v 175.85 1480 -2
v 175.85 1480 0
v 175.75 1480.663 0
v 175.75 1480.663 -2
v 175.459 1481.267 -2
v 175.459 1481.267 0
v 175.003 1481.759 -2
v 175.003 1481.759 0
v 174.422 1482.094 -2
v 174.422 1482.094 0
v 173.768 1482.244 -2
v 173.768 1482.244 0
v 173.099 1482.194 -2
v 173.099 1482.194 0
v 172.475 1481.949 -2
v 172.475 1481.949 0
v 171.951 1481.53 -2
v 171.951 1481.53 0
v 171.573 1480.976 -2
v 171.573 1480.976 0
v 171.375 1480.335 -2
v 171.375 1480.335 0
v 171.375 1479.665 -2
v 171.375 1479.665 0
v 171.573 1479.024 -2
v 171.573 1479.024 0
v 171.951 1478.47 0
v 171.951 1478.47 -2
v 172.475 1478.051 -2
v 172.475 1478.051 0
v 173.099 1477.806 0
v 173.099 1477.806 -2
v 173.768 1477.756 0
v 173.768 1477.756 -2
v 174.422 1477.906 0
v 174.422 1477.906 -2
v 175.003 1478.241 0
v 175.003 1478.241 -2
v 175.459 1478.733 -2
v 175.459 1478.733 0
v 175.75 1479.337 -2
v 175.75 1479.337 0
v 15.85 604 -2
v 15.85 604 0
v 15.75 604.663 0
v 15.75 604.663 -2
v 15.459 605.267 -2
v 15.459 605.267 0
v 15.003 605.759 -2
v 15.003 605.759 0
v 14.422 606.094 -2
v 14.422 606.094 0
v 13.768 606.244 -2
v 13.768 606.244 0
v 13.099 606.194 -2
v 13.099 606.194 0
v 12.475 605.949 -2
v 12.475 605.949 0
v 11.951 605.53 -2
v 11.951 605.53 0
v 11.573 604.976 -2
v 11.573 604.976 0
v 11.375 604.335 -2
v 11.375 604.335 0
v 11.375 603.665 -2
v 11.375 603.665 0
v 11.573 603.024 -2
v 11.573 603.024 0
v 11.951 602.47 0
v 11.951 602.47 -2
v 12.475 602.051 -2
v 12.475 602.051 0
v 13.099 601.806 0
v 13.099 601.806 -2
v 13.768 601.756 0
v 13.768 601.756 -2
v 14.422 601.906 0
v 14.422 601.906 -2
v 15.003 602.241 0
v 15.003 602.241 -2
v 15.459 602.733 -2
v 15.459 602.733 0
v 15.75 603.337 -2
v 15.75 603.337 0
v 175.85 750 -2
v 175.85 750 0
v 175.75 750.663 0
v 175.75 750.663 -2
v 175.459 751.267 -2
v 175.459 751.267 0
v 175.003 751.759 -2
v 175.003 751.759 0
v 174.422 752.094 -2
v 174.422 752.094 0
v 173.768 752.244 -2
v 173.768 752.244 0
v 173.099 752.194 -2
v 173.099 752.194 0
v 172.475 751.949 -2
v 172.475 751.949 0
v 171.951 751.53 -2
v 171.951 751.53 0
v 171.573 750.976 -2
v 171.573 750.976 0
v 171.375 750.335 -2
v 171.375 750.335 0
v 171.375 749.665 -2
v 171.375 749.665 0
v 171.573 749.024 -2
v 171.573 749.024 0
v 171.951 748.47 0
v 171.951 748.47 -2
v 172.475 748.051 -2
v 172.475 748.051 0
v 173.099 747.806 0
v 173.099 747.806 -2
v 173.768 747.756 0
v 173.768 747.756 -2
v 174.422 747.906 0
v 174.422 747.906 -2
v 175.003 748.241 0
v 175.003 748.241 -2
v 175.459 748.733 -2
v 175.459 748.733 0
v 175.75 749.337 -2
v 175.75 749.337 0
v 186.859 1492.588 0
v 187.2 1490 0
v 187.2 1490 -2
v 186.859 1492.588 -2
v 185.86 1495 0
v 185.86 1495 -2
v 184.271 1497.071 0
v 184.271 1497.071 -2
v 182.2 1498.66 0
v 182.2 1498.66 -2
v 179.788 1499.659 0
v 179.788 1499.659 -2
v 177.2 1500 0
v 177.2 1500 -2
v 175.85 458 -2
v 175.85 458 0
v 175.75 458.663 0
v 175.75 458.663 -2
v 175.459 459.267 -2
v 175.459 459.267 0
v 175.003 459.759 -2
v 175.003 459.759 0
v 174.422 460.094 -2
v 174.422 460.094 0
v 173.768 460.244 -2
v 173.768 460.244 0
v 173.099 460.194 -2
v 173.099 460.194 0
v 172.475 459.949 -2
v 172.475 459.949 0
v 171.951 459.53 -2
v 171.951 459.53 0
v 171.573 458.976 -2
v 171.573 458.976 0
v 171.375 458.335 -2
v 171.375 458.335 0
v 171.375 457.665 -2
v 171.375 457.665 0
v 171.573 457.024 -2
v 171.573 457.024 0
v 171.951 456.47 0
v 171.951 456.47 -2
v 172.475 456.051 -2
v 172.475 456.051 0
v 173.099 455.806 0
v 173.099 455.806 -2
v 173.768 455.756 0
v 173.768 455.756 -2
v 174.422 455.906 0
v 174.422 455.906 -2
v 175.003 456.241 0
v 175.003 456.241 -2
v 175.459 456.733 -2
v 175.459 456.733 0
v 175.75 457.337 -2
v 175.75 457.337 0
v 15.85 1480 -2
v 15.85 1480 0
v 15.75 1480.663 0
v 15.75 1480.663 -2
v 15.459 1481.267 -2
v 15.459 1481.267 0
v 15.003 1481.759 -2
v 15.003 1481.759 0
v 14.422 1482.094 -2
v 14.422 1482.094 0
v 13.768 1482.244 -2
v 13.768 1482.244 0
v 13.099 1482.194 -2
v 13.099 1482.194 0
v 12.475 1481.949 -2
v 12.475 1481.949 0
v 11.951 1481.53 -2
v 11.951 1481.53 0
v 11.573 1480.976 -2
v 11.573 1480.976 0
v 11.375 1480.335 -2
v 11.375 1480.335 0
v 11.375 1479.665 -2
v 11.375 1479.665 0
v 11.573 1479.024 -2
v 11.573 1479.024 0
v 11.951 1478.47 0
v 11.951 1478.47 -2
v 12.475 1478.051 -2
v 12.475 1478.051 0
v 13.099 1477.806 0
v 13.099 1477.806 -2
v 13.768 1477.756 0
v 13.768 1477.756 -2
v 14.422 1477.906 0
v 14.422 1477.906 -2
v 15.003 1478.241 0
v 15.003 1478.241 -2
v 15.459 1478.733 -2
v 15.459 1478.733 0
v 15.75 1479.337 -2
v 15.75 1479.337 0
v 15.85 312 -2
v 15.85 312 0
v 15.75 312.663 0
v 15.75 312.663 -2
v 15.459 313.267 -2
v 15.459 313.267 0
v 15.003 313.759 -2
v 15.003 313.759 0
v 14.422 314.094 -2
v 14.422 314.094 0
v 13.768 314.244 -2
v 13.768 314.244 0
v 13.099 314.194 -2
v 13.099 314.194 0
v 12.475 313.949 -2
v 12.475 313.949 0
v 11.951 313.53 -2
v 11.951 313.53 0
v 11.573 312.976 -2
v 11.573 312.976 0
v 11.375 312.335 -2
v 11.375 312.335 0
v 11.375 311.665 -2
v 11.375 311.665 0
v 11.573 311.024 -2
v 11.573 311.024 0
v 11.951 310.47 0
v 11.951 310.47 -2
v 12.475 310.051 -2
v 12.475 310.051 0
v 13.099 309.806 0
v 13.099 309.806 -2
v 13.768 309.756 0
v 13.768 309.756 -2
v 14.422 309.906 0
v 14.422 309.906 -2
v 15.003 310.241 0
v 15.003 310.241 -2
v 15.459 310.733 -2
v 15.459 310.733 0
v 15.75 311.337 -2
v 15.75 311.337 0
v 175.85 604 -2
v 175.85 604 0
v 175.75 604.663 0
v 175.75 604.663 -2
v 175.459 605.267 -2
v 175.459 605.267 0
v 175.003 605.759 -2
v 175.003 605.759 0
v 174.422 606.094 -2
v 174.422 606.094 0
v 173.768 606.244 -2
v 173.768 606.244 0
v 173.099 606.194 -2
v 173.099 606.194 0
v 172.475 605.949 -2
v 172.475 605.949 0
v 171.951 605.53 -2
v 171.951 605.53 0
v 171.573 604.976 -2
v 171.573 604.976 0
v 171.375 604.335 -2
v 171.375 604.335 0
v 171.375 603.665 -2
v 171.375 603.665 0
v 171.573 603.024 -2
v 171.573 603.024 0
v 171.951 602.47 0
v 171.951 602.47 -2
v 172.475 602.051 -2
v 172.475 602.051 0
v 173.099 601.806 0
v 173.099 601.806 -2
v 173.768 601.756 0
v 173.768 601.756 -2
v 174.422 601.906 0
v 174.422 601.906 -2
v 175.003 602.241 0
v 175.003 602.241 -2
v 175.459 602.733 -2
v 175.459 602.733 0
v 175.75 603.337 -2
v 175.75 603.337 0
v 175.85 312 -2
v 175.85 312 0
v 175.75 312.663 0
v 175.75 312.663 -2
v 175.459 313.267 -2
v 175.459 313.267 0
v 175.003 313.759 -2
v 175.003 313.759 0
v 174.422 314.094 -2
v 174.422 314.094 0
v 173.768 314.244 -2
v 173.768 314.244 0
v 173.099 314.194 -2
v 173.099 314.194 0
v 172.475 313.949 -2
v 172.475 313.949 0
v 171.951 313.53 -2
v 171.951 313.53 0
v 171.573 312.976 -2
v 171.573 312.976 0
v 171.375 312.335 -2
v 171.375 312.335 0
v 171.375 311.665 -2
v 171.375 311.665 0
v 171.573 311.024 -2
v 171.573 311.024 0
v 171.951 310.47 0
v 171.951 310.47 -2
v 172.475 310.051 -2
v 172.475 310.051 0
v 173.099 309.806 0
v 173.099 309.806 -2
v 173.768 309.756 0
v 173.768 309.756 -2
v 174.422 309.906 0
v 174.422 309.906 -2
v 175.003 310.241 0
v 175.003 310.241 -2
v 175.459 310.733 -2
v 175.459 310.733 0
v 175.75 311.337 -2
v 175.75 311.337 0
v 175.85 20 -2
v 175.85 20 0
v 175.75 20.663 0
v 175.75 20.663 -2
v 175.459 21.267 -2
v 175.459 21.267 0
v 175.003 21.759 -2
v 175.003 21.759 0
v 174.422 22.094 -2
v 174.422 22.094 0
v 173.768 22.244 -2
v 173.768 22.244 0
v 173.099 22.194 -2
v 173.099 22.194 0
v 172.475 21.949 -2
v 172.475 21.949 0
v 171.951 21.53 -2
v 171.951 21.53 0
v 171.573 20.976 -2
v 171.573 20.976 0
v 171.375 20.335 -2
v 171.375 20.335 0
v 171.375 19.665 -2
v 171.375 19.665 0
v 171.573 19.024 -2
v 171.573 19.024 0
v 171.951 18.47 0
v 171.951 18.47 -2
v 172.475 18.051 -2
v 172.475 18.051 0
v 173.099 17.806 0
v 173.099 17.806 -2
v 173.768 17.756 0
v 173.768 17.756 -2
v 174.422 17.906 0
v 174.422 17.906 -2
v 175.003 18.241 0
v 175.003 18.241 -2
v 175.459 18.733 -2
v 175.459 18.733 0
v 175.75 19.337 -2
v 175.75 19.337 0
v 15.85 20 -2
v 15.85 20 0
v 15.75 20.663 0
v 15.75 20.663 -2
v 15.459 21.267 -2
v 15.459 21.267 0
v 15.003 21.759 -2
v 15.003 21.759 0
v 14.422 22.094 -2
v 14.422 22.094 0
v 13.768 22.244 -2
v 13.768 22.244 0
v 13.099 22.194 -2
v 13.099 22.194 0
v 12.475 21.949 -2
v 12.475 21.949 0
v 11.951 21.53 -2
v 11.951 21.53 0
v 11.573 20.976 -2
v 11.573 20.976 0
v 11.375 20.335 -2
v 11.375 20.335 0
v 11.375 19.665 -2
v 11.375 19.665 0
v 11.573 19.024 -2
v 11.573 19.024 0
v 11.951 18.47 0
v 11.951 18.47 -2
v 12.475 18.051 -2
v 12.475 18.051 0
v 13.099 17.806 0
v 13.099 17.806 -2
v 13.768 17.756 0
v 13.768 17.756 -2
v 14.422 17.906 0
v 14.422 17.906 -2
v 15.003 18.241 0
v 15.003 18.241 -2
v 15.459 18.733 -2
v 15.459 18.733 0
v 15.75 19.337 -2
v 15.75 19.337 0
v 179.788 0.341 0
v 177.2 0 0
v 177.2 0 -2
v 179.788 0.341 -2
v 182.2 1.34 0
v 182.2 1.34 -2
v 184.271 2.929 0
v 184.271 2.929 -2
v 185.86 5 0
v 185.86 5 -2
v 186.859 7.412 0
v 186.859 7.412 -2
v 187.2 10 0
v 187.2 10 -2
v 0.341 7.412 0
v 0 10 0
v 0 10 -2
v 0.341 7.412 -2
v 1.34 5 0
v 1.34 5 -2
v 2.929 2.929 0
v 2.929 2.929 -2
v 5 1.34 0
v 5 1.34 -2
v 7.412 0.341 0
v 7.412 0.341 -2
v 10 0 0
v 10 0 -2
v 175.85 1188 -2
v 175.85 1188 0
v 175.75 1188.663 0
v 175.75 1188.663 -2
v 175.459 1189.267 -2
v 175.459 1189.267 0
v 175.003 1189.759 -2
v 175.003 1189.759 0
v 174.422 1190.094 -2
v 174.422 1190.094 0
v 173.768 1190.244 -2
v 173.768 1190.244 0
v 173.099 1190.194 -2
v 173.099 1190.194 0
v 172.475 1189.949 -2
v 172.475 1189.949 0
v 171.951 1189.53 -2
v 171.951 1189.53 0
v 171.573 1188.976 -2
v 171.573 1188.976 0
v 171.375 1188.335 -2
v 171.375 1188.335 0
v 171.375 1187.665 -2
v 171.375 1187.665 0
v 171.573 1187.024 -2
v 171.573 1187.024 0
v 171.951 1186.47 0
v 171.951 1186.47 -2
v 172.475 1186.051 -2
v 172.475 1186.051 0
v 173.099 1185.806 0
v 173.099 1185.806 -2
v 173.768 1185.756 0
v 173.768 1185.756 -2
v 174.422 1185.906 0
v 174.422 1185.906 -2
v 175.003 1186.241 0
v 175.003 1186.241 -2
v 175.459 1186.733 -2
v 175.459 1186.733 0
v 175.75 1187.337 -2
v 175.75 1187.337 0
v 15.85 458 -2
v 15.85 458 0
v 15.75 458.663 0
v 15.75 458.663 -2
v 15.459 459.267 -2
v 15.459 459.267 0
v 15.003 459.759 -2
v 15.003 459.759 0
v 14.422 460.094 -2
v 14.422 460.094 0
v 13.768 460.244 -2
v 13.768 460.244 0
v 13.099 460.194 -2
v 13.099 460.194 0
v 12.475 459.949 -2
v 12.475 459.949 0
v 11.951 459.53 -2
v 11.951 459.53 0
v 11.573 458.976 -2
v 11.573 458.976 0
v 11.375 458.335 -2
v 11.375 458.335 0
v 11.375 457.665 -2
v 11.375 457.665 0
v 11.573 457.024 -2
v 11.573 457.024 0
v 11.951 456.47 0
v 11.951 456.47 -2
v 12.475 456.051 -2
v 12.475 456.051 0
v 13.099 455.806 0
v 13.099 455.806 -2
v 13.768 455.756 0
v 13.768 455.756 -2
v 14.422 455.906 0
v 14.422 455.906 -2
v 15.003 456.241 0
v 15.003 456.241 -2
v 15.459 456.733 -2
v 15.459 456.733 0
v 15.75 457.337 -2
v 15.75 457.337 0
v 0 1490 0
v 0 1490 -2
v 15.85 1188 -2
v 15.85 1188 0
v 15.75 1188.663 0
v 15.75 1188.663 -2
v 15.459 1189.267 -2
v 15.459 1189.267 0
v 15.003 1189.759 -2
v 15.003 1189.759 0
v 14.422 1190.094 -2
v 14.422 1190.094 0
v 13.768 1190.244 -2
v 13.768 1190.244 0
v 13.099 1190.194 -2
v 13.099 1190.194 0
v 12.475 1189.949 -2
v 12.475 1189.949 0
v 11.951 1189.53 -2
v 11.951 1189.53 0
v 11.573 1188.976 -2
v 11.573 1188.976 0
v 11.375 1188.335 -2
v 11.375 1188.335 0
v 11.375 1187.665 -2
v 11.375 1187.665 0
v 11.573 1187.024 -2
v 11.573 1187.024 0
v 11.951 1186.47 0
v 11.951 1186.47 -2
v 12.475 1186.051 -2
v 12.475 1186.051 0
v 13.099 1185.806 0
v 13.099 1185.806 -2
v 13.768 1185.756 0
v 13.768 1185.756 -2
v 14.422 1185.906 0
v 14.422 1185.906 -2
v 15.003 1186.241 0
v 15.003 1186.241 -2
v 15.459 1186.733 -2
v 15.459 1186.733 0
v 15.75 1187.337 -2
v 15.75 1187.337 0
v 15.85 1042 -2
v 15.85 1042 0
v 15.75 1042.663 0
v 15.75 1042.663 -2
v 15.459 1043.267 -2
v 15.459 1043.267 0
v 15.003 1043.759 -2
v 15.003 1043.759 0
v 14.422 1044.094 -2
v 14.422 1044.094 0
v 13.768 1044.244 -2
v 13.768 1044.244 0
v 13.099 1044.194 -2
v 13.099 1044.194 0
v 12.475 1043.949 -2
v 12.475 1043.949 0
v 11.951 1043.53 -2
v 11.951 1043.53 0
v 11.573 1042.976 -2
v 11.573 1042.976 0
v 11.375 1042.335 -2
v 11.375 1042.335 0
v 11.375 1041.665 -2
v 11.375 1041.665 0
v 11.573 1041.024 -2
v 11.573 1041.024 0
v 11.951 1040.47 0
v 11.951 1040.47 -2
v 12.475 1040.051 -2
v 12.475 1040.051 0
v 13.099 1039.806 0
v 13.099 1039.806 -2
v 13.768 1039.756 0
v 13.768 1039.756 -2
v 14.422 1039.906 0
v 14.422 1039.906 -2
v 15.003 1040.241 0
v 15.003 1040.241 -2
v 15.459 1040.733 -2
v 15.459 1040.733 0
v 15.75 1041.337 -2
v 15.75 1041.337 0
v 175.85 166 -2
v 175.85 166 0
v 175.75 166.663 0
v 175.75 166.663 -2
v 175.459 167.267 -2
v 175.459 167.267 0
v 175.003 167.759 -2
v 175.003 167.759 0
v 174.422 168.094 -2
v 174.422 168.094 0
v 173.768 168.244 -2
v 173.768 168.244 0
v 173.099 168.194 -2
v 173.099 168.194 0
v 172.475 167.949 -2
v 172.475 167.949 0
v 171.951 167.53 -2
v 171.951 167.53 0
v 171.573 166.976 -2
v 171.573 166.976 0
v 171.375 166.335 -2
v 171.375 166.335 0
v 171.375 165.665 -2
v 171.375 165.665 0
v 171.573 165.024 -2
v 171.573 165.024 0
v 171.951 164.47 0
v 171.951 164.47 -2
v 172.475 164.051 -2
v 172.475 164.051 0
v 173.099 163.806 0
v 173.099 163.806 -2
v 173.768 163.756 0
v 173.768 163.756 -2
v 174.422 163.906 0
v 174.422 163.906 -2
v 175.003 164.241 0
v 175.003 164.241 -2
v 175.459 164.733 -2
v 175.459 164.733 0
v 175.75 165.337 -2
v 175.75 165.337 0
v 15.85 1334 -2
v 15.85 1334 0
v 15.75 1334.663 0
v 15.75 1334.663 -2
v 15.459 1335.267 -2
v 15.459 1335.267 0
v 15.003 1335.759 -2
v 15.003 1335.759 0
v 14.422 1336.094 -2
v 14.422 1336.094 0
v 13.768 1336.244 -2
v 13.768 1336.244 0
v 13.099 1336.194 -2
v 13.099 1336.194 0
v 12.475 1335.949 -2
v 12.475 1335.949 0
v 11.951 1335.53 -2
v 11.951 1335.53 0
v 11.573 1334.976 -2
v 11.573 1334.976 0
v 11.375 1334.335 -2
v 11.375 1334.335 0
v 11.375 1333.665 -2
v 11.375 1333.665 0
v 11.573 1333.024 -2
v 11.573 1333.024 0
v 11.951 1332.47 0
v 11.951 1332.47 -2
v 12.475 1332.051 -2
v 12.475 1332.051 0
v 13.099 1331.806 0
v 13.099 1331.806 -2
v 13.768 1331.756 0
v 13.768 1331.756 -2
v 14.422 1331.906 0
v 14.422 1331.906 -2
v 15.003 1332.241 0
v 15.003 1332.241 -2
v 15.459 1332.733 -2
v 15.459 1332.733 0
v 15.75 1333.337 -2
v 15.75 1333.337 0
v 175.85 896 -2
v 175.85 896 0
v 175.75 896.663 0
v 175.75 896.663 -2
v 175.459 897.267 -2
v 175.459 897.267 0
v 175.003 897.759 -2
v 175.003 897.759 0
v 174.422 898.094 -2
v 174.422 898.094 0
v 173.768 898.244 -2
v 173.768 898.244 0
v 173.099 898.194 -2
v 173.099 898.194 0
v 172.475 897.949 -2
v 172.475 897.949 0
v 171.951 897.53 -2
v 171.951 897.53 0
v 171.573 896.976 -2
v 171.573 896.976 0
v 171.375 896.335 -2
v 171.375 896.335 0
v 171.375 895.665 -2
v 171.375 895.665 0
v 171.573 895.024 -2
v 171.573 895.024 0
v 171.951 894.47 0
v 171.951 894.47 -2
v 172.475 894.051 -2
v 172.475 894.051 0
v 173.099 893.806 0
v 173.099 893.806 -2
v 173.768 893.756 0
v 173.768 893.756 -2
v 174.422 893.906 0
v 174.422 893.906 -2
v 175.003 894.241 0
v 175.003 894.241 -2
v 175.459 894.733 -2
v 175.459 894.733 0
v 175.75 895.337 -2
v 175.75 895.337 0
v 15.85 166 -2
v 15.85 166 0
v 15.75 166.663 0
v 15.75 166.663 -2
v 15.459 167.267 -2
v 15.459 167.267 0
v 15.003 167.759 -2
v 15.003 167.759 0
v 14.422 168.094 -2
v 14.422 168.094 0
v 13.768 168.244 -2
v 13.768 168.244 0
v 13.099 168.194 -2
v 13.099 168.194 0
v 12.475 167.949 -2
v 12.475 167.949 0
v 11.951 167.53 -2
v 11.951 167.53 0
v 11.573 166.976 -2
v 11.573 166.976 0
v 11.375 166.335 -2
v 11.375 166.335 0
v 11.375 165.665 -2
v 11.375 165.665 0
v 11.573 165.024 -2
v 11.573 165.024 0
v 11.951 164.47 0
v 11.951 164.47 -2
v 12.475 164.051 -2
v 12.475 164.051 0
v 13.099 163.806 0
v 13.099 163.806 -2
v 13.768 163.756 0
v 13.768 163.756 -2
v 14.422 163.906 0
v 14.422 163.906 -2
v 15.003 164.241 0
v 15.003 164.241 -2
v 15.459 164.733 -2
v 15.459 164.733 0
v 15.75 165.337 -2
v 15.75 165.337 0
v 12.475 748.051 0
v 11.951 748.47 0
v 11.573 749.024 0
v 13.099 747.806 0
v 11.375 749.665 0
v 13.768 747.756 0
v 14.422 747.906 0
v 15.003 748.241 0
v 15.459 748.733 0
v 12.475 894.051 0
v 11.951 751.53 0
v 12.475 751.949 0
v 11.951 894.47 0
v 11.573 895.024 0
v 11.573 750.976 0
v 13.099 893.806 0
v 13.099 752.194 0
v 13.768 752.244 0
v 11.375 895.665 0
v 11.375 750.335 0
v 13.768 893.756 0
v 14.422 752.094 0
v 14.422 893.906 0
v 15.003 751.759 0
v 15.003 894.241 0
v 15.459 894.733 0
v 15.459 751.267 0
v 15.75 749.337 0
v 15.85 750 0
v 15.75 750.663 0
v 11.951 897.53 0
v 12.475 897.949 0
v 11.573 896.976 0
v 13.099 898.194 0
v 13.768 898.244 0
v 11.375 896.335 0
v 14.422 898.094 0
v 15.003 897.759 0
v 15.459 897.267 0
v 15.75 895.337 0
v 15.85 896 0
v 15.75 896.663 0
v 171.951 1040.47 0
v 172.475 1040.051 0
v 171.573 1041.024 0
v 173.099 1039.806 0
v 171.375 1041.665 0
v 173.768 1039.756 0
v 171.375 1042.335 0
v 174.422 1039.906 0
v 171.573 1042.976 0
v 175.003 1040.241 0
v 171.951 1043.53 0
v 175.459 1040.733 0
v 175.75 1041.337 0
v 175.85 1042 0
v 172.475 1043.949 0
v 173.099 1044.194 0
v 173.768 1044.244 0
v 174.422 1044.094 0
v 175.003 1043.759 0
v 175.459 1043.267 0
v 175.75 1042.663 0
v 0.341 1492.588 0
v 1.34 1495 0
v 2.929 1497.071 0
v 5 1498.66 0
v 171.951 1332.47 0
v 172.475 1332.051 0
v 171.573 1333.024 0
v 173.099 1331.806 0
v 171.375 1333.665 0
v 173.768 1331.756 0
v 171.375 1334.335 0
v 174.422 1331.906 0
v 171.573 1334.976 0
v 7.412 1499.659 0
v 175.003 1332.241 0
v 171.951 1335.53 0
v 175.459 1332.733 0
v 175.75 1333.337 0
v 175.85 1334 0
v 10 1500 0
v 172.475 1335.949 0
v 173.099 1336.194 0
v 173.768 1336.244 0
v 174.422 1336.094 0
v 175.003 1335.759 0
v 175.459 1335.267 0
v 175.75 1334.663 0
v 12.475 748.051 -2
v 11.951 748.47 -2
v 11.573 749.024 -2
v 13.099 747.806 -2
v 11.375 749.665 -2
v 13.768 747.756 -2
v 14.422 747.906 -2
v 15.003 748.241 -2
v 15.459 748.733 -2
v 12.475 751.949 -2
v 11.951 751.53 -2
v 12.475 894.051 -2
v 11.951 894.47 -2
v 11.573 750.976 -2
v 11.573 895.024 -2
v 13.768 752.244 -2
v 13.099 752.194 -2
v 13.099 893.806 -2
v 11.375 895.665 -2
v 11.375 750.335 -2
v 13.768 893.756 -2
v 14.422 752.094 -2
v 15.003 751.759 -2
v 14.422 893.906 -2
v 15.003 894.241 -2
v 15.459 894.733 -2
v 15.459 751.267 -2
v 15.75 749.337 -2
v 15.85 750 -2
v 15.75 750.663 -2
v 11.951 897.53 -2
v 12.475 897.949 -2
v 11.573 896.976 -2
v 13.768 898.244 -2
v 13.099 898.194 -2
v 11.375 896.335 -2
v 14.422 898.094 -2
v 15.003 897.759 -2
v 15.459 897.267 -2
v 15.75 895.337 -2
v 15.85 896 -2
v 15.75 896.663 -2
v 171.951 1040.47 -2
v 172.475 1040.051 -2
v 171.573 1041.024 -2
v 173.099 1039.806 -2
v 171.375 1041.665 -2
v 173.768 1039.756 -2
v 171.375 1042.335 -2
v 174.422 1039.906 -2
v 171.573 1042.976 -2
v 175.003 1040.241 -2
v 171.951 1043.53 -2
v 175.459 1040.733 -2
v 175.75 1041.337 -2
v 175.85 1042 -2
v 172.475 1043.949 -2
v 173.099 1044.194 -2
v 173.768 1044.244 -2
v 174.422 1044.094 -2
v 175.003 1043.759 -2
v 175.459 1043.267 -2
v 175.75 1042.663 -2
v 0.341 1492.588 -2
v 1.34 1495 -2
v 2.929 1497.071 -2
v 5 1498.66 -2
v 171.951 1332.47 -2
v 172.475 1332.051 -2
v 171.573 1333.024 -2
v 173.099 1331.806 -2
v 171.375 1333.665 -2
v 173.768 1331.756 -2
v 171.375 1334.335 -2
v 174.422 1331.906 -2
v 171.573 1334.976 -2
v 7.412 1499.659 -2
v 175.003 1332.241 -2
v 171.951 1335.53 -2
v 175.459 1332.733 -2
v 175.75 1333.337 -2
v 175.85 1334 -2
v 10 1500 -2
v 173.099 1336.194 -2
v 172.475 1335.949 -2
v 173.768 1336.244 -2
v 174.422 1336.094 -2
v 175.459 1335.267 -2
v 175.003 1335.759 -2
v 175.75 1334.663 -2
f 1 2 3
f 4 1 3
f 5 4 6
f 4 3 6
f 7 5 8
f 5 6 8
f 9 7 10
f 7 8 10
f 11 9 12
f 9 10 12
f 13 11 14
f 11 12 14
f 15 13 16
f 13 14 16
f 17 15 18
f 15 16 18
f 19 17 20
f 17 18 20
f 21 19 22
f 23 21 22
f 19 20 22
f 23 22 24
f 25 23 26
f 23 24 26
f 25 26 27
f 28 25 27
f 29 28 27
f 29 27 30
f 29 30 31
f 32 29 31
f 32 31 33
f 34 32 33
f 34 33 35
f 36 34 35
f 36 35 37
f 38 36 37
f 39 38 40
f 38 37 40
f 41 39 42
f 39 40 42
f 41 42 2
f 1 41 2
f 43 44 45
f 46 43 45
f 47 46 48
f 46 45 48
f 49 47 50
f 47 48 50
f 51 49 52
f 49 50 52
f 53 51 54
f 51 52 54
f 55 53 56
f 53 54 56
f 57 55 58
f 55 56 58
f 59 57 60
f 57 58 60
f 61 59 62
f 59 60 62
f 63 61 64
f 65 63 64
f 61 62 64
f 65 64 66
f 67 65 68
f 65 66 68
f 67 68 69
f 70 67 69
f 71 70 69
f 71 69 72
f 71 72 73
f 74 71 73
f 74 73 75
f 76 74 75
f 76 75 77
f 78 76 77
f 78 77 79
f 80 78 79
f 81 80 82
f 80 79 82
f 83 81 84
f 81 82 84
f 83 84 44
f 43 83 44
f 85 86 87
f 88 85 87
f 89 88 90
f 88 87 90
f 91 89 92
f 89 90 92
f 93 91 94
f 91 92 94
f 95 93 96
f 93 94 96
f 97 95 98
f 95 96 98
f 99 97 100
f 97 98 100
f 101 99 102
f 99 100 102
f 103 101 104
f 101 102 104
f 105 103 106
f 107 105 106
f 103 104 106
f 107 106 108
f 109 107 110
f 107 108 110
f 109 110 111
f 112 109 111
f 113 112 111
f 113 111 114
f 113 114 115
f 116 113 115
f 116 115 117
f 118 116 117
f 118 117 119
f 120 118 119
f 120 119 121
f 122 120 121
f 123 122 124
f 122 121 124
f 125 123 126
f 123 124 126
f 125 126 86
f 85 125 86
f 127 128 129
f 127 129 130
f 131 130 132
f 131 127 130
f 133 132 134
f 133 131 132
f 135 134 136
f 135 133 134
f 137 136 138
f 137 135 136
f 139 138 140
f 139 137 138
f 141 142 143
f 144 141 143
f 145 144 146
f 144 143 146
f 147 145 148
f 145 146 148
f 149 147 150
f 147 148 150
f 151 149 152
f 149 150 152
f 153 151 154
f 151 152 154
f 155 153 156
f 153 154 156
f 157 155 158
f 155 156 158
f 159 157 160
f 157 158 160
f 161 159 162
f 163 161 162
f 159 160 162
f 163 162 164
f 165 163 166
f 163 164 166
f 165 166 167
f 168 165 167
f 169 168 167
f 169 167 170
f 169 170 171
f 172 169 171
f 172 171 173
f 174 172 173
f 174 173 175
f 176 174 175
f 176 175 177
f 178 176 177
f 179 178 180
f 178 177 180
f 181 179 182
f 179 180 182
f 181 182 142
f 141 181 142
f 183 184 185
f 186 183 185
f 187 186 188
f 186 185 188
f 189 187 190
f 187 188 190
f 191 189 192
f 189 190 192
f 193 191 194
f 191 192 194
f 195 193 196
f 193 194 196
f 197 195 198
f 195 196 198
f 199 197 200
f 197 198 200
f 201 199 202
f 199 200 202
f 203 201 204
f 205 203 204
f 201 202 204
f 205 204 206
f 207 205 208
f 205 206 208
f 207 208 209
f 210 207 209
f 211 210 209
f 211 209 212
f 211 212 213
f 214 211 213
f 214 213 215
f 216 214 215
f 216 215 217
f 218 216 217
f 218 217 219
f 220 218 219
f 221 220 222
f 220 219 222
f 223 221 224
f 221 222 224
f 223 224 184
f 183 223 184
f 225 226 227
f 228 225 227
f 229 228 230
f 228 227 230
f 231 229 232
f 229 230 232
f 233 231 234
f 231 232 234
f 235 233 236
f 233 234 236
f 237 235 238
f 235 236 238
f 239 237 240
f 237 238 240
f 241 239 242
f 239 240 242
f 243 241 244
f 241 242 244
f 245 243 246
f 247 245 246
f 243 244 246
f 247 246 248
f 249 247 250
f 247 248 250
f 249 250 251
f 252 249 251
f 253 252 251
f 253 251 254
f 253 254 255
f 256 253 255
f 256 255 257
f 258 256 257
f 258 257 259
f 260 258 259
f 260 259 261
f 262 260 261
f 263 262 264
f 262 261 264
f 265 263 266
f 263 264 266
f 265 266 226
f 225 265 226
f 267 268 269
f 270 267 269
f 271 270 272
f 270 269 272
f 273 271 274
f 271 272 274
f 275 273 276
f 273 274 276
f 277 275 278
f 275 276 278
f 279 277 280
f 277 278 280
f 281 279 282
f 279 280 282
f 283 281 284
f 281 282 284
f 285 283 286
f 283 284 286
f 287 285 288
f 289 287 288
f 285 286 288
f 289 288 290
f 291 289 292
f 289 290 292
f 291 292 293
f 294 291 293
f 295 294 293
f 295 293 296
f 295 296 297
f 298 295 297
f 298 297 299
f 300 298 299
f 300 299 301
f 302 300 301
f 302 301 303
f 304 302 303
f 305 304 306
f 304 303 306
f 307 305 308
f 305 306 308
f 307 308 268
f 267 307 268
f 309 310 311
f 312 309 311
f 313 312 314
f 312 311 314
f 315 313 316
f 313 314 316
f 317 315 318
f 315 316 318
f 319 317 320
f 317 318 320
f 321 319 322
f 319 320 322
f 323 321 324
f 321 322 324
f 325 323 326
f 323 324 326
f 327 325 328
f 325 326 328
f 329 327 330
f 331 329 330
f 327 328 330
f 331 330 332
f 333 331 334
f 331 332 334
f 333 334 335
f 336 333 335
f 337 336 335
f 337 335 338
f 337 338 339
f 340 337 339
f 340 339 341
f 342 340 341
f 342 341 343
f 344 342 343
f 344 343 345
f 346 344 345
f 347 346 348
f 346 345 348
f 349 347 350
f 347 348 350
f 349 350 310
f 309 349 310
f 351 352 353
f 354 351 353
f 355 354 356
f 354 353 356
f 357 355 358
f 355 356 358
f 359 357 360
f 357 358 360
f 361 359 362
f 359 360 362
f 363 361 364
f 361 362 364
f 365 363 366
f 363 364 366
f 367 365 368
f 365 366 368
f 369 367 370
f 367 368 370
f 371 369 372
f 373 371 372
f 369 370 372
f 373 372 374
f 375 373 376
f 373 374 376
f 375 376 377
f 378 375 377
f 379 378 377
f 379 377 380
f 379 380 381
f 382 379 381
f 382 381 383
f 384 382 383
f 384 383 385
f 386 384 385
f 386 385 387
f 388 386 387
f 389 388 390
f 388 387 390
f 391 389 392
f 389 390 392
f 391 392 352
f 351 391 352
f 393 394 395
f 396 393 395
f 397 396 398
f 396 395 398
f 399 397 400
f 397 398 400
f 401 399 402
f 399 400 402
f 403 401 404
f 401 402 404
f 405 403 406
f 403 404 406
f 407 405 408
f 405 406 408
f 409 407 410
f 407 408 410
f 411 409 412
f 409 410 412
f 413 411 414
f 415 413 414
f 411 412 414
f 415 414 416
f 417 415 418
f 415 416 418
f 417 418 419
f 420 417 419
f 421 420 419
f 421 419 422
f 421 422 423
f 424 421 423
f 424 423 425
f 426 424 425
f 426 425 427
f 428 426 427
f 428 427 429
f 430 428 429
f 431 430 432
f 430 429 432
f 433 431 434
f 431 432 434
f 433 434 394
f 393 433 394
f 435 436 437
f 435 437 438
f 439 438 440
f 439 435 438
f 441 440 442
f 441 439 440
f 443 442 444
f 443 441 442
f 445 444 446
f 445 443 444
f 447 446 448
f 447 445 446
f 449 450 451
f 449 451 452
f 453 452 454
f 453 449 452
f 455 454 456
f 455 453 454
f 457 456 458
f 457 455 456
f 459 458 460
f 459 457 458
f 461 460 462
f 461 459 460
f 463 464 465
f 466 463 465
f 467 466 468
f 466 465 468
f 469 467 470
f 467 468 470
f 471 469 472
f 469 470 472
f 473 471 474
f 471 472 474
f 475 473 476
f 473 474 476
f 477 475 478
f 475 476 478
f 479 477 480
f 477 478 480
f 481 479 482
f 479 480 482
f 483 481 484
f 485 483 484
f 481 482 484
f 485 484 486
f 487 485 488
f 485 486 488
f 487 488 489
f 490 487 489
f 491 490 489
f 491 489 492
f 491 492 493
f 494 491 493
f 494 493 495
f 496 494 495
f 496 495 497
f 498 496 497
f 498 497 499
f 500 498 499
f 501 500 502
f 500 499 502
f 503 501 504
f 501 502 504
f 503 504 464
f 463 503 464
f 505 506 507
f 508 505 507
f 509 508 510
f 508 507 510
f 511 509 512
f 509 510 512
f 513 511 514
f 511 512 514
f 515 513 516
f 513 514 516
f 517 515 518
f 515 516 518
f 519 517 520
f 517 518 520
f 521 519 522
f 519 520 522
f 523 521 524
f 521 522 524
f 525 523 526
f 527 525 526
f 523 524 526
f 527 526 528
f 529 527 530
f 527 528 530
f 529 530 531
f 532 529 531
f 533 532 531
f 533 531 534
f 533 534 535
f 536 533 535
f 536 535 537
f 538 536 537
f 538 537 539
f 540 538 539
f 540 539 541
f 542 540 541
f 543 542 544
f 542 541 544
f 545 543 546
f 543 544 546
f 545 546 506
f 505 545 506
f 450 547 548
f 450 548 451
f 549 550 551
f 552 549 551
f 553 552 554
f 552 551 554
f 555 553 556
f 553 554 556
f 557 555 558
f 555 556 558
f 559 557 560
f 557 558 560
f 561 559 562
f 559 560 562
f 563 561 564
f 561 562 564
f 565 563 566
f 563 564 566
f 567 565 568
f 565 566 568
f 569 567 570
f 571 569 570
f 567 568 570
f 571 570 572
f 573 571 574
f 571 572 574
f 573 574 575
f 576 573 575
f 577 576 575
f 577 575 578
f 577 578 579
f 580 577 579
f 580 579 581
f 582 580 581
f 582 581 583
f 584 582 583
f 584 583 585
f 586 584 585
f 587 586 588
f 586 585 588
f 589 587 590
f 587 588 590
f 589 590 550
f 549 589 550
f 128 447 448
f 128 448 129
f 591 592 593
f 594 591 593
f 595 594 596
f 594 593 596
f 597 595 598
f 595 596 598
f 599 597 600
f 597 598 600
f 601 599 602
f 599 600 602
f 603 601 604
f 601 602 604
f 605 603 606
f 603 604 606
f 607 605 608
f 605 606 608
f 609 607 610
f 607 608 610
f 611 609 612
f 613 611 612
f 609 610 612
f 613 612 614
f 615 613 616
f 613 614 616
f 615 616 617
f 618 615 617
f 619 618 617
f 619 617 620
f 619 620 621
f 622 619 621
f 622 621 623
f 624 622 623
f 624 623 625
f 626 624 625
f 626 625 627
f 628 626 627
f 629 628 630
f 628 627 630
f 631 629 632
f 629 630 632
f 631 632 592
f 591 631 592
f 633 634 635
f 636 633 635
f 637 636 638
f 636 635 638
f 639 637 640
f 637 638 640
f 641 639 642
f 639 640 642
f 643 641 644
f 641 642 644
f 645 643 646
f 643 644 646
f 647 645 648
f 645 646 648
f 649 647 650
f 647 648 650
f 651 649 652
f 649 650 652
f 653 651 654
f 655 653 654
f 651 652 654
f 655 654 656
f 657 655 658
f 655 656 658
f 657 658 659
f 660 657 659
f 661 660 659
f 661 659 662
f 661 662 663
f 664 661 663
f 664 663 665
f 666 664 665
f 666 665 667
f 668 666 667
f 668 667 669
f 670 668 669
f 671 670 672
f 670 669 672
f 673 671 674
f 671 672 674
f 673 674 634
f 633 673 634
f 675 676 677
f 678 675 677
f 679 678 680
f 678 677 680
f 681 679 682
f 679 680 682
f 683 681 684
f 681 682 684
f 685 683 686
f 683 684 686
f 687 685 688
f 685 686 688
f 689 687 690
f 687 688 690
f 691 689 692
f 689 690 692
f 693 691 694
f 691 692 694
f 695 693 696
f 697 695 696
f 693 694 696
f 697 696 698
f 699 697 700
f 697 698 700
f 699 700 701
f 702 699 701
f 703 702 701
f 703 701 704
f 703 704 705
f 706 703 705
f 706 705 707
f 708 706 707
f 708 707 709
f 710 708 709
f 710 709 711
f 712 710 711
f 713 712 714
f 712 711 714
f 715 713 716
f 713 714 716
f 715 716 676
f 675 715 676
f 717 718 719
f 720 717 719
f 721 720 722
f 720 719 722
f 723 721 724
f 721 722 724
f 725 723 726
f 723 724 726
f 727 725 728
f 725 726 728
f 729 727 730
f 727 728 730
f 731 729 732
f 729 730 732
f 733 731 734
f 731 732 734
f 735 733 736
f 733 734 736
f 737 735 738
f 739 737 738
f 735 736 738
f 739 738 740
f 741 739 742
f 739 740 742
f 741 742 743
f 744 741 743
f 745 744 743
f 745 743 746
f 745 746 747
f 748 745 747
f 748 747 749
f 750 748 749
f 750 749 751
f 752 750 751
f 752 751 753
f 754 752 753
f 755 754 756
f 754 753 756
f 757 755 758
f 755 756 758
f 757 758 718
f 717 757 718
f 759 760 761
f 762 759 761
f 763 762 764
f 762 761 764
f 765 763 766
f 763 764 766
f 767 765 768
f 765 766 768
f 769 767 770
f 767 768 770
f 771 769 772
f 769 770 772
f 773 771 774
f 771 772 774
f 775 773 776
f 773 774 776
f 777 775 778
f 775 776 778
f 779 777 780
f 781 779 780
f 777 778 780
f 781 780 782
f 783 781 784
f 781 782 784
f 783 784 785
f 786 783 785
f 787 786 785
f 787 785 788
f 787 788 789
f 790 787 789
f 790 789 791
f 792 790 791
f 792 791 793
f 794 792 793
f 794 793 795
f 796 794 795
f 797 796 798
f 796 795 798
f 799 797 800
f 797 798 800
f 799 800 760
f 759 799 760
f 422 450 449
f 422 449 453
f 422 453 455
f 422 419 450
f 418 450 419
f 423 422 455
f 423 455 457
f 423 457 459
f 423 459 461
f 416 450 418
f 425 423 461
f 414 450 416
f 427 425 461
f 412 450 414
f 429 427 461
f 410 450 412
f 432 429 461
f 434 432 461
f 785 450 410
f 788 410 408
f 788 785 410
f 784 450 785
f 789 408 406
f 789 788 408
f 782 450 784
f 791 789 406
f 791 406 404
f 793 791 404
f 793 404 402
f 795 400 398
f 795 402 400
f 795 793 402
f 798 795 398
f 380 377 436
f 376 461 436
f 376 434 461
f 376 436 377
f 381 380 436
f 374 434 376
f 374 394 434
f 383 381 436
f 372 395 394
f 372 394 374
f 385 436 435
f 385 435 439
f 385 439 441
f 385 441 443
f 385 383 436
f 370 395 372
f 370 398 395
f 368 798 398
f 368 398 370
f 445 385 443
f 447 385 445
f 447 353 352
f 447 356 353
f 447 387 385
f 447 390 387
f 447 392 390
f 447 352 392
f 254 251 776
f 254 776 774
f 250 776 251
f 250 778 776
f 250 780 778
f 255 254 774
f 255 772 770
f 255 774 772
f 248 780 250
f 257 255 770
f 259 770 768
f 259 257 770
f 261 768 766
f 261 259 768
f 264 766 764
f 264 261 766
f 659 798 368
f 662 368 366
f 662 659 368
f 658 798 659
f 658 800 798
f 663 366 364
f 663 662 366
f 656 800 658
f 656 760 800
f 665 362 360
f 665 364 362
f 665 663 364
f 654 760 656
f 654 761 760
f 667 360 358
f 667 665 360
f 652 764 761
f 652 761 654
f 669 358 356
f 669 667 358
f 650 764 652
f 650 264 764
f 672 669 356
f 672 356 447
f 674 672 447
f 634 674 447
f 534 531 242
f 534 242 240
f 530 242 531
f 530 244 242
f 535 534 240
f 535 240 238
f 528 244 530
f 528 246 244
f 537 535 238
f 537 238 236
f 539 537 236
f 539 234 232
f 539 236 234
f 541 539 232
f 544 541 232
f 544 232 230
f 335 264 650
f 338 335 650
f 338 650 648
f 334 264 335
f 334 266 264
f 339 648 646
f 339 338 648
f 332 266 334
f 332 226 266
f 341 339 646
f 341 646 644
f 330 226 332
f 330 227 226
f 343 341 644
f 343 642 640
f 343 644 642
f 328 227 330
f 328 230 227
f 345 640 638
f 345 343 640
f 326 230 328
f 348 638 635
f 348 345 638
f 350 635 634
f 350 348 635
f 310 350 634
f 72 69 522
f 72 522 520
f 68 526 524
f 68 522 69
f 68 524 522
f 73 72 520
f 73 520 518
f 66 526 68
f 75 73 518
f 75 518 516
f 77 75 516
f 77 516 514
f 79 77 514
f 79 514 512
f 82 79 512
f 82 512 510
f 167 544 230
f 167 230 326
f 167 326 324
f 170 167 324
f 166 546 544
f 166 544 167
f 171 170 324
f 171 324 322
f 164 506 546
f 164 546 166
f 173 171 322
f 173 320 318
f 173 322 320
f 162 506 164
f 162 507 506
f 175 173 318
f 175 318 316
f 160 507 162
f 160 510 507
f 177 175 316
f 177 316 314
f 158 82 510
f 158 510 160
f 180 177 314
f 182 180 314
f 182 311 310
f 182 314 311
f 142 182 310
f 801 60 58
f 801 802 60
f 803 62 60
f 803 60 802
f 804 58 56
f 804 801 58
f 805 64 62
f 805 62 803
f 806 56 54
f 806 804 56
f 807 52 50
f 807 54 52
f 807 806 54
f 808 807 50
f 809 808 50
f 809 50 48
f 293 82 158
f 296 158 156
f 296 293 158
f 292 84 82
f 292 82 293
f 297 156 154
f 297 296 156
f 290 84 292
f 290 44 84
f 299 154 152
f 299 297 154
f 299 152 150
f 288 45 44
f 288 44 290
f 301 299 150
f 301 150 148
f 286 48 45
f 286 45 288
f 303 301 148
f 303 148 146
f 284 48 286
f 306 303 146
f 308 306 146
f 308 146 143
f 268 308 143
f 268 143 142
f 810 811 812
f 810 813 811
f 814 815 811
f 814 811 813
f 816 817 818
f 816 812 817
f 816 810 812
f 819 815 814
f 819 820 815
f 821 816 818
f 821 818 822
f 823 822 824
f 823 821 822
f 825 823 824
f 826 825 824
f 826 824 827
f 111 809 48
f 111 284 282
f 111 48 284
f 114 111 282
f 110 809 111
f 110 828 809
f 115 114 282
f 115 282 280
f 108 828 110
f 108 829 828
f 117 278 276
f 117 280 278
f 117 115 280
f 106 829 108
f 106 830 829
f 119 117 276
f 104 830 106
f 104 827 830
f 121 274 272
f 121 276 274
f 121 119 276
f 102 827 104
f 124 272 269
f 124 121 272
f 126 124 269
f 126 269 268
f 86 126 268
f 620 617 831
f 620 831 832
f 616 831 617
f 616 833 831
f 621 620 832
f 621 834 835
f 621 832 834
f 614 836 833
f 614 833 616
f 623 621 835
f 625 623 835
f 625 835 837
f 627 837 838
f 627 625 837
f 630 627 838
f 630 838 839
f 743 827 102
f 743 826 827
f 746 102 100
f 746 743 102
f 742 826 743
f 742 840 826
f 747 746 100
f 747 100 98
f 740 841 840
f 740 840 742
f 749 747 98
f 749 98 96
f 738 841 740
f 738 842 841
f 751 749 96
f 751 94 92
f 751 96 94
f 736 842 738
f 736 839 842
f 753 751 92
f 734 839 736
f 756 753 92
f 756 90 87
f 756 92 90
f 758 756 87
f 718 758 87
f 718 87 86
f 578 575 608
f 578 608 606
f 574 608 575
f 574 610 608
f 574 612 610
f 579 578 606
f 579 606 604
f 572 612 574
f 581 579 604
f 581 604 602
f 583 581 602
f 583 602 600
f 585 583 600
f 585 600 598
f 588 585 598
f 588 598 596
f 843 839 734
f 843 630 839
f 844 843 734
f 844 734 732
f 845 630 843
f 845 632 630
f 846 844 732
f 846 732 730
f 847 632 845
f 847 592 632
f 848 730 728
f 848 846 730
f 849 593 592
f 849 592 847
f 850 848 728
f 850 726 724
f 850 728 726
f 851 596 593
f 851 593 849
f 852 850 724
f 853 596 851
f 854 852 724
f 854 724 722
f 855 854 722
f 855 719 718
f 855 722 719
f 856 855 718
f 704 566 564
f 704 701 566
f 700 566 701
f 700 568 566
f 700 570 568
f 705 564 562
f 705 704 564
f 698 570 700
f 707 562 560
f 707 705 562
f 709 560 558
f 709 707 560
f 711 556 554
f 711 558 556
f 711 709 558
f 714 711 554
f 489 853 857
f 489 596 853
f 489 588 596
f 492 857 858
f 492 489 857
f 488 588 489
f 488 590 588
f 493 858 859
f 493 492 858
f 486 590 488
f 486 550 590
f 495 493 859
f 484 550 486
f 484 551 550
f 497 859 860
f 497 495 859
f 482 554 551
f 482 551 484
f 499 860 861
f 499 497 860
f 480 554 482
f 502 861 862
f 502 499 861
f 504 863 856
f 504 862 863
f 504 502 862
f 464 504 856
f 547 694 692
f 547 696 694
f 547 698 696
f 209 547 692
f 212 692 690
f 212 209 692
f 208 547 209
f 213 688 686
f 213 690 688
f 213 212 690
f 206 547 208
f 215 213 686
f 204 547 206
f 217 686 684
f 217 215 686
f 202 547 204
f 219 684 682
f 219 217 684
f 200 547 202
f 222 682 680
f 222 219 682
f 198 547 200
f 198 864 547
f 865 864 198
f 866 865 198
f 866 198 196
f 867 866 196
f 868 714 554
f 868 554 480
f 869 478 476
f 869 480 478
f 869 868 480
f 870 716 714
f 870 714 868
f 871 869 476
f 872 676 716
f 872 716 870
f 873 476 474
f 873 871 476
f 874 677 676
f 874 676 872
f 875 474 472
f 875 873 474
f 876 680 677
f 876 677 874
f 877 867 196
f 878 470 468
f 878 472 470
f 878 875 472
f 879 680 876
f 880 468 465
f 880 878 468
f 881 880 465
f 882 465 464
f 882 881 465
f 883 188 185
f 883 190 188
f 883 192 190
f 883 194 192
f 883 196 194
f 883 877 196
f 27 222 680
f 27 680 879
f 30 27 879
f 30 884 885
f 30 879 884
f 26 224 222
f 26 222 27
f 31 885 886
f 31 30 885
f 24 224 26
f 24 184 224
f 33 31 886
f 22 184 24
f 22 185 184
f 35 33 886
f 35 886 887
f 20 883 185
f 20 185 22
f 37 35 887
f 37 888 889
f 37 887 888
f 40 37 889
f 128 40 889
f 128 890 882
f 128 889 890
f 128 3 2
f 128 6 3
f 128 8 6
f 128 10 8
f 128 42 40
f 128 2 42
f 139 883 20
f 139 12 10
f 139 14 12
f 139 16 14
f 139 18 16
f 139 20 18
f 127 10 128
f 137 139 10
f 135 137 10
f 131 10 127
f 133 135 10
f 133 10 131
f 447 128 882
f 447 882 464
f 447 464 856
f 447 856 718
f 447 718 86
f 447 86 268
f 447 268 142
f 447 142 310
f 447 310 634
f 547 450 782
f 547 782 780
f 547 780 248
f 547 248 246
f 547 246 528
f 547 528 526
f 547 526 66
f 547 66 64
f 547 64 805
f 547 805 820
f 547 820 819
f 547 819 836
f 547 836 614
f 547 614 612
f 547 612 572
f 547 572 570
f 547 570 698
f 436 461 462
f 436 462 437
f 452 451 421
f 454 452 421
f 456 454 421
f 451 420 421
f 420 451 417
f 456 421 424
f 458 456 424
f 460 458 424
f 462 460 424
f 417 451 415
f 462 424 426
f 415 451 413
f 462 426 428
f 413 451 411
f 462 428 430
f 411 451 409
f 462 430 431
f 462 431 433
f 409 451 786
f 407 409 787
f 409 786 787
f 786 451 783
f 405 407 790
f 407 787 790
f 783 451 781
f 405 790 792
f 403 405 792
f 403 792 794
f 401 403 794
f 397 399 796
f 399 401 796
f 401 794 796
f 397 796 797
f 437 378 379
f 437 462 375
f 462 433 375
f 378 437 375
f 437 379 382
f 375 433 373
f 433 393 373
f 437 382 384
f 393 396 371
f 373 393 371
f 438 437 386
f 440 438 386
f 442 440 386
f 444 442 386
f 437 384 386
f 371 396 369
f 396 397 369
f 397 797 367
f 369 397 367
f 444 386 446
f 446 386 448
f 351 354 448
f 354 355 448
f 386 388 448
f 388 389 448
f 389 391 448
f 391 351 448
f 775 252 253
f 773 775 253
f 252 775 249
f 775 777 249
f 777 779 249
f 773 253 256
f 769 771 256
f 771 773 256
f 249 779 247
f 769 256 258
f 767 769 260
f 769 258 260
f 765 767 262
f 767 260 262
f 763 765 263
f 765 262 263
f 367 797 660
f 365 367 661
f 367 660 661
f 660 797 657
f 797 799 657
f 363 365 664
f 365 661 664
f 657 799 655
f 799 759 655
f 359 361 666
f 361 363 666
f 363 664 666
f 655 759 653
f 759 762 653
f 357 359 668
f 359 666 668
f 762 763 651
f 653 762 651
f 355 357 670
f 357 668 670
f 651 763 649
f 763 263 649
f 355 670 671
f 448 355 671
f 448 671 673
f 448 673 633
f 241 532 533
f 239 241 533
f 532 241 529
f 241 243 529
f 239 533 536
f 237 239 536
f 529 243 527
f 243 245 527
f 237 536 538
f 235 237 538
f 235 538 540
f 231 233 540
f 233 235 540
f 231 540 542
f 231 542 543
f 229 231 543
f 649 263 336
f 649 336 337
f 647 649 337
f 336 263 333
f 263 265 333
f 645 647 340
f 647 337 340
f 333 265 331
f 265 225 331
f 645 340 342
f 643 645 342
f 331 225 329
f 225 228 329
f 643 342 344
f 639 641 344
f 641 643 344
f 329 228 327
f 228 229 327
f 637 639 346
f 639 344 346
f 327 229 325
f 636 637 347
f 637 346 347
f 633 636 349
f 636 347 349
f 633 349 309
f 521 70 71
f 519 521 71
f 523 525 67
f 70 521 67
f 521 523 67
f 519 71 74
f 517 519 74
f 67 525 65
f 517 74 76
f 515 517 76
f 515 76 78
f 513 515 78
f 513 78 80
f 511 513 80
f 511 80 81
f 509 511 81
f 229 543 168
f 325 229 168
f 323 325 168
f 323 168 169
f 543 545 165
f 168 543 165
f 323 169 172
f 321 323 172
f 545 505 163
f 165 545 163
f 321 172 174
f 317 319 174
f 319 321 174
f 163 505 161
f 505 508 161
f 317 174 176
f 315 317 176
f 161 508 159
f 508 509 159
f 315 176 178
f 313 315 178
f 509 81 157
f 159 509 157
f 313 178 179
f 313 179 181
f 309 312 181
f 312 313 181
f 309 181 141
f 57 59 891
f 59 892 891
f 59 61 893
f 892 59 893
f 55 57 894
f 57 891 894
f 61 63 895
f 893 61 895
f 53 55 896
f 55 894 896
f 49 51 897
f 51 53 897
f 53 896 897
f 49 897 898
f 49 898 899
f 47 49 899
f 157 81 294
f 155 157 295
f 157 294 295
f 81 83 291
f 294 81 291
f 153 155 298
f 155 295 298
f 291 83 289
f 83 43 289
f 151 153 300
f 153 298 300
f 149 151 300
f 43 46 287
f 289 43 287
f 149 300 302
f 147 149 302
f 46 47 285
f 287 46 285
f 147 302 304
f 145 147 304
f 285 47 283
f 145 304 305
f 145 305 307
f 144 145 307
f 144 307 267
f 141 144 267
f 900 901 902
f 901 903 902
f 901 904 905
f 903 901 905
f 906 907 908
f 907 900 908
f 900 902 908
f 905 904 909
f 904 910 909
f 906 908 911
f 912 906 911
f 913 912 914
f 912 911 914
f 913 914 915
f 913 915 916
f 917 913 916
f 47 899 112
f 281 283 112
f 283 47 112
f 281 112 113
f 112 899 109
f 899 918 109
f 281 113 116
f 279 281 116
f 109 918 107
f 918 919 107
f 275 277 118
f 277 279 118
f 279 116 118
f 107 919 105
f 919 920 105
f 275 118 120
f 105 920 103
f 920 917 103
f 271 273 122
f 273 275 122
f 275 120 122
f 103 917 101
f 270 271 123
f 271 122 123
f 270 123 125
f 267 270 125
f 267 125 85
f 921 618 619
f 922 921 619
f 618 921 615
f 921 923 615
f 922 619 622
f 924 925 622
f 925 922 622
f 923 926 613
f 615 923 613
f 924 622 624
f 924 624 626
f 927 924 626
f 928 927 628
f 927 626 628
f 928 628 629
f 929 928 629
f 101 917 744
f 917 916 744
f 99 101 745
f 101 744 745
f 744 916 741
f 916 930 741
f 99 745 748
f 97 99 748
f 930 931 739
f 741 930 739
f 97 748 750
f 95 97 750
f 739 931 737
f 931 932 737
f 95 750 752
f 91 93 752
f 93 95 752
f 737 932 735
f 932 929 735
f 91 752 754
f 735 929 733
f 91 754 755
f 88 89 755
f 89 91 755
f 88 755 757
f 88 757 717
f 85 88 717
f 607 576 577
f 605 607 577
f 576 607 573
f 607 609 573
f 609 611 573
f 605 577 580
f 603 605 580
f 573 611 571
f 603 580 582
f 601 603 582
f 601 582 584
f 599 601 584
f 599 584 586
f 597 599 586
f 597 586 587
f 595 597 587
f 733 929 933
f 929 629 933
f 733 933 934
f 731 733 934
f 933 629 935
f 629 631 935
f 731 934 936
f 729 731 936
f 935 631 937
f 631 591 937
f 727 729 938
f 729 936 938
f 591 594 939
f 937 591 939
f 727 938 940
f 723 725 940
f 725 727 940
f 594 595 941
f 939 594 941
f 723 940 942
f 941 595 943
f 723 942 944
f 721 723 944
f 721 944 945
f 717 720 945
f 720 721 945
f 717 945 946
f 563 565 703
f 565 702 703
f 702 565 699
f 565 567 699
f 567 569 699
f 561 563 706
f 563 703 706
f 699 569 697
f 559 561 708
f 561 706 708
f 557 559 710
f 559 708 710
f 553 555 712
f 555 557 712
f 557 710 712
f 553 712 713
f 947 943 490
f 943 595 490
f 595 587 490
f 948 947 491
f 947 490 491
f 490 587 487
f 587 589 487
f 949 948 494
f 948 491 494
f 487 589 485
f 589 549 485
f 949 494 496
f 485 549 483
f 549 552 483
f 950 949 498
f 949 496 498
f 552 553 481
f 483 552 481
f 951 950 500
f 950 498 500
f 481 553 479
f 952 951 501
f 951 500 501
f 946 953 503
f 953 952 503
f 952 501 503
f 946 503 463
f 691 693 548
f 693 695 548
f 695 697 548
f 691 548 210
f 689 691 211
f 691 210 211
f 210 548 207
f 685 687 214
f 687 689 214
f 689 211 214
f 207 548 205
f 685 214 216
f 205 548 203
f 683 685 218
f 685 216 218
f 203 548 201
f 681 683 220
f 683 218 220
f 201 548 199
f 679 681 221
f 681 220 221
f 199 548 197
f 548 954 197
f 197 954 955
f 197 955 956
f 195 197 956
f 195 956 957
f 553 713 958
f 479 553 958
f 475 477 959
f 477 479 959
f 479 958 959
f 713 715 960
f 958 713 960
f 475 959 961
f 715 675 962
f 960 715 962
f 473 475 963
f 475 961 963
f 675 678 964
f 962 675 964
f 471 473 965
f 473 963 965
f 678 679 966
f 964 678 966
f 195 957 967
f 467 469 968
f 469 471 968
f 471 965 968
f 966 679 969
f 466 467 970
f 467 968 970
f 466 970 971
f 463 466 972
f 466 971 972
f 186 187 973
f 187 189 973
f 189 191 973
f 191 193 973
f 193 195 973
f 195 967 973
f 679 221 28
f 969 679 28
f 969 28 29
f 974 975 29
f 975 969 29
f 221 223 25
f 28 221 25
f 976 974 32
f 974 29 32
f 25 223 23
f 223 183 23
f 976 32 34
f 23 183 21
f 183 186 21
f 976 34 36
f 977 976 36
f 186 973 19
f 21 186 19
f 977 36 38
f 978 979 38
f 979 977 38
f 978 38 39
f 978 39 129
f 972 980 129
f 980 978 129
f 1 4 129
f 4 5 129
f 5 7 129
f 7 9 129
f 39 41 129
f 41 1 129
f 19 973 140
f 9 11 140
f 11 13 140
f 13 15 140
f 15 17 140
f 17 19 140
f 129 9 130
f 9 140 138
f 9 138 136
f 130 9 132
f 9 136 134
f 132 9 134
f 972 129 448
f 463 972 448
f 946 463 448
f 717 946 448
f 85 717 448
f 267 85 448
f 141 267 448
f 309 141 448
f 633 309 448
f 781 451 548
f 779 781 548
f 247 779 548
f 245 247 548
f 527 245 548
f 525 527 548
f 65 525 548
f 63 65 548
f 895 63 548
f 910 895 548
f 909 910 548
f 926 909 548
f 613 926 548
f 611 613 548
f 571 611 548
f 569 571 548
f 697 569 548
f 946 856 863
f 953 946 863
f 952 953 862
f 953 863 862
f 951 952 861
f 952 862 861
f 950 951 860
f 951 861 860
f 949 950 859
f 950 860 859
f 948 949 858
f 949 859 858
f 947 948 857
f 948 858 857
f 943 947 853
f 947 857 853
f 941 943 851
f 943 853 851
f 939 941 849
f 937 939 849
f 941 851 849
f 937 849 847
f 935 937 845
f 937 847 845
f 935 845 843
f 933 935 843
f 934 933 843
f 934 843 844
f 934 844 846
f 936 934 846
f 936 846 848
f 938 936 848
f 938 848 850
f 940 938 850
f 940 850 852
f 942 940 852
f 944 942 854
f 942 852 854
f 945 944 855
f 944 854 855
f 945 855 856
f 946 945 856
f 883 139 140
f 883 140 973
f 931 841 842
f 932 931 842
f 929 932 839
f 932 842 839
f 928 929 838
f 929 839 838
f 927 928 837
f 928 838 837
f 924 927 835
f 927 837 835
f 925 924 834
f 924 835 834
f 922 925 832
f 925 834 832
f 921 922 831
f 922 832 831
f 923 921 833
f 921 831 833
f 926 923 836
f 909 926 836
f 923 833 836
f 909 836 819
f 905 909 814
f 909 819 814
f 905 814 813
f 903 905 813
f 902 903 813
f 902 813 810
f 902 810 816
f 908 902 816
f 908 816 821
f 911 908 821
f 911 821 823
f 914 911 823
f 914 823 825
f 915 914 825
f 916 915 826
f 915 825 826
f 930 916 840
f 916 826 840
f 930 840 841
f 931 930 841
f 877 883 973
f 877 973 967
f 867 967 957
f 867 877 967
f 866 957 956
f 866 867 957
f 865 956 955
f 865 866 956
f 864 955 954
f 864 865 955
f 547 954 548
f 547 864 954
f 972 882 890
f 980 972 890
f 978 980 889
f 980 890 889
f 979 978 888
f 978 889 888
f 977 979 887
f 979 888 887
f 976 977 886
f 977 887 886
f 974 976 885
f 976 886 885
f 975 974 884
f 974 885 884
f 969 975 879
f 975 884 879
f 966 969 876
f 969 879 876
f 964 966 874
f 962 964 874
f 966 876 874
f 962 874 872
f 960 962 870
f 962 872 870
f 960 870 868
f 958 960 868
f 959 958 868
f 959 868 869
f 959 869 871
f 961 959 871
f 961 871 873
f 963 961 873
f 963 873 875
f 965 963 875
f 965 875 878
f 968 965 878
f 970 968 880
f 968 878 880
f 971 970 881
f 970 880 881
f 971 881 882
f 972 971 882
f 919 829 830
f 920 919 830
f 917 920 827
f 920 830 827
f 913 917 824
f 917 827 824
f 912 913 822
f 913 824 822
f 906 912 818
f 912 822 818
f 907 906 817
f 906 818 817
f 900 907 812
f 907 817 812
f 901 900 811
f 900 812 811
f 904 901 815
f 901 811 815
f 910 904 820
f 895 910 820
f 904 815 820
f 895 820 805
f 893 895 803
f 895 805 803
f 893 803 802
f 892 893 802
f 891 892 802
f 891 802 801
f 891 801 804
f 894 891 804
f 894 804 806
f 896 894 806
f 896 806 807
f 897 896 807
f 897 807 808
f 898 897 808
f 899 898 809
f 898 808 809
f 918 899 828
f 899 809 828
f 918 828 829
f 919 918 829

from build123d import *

# Parameters (mm, degrees)
SKETCH1_R          = 2.25
BASE_FLANGE1_DEPTH = 2


# Sheet-metal steps are written as plain solids
with BuildPart() as part:
    # Sketch1 → Base-Flange1 (new body)
    with BuildSketch(Plane.XY):
        with BuildLine():
            Line((10, 0), (177.2, 0))
            ThreePointArc((177.2, 0), (184.271067812, 2.928932188), (187.2, 10))
            Line((187.2, 10), (187.2, 1490))
            ThreePointArc((187.2, 1490), (184.271067812, 1497.071067812), (177.2, 1500))
            Line((177.2, 1500), (10, 1500))
            ThreePointArc((10, 1500), (2.928932188, 1497.071067812), (0, 1490))
            Line((0, 1490), (0, 10))
            ThreePointArc((0, 10), (2.928932188, 2.928932188), (10, 0))
        make_face()
        with Locations((13.6, 1480)):
            Circle(SKETCH1_R, mode=Mode.SUBTRACT)
        with Locations((173.6, 1480)):
            Circle(SKETCH1_R, mode=Mode.SUBTRACT)
        with Locations((173.6, 1334)):
            Circle(SKETCH1_R, mode=Mode.SUBTRACT)
        with Locations((173.6, 1188)):
            Circle(SKETCH1_R, mode=Mode.SUBTRACT)
        with Locations((173.6, 1042)):
            Circle(SKETCH1_R, mode=Mode.SUBTRACT)
        with Locations((173.6, 896)):
            Circle(SKETCH1_R, mode=Mode.SUBTRACT)
        with Locations((173.6, 750)):
            Circle(SKETCH1_R, mode=Mode.SUBTRACT)
        with Locations((173.6, 604)):
            Circle(SKETCH1_R, mode=Mode.SUBTRACT)
        with Locations((173.6, 458)):
            Circle(SKETCH1_R, mode=Mode.SUBTRACT)
        with Locations((173.6, 312)):
            Circle(SKETCH1_R, mode=Mode.SUBTRACT)
        with Locations((173.6, 166)):
            Circle(SKETCH1_R, mode=Mode.SUBTRACT)
        with Locations((173.6, 20)):
            Circle(SKETCH1_R, mode=Mode.SUBTRACT)
        with Locations((13.6, 1334)):
            Circle(SKETCH1_R, mode=Mode.SUBTRACT)
        with Locations((13.6, 1188)):
            Circle(SKETCH1_R, mode=Mode.SUBTRACT)
        with Locations((13.6, 1042)):
            Circle(SKETCH1_R, mode=Mode.SUBTRACT)
        with Locations((13.6, 896)):
            Circle(SKETCH1_R, mode=Mode.SUBTRACT)
        with Locations((13.6, 750)):
            Circle(SKETCH1_R, mode=Mode.SUBTRACT)
        with Locations((13.6, 604)):
            Circle(SKETCH1_R, mode=Mode.SUBTRACT)
        with Locations((13.6, 458)):
            Circle(SKETCH1_R, mode=Mode.SUBTRACT)
        with Locations((13.6, 312)):
            Circle(SKETCH1_R, mode=Mode.SUBTRACT)
        with Locations((13.6, 166)):
            Circle(SKETCH1_R, mode=Mode.SUBTRACT)
        with Locations((13.6, 20)):
            Circle(SKETCH1_R, mode=Mode.SUBTRACT)
    extrude(amount=-BASE_FLANGE1_DEPTH)


solid = part.part
